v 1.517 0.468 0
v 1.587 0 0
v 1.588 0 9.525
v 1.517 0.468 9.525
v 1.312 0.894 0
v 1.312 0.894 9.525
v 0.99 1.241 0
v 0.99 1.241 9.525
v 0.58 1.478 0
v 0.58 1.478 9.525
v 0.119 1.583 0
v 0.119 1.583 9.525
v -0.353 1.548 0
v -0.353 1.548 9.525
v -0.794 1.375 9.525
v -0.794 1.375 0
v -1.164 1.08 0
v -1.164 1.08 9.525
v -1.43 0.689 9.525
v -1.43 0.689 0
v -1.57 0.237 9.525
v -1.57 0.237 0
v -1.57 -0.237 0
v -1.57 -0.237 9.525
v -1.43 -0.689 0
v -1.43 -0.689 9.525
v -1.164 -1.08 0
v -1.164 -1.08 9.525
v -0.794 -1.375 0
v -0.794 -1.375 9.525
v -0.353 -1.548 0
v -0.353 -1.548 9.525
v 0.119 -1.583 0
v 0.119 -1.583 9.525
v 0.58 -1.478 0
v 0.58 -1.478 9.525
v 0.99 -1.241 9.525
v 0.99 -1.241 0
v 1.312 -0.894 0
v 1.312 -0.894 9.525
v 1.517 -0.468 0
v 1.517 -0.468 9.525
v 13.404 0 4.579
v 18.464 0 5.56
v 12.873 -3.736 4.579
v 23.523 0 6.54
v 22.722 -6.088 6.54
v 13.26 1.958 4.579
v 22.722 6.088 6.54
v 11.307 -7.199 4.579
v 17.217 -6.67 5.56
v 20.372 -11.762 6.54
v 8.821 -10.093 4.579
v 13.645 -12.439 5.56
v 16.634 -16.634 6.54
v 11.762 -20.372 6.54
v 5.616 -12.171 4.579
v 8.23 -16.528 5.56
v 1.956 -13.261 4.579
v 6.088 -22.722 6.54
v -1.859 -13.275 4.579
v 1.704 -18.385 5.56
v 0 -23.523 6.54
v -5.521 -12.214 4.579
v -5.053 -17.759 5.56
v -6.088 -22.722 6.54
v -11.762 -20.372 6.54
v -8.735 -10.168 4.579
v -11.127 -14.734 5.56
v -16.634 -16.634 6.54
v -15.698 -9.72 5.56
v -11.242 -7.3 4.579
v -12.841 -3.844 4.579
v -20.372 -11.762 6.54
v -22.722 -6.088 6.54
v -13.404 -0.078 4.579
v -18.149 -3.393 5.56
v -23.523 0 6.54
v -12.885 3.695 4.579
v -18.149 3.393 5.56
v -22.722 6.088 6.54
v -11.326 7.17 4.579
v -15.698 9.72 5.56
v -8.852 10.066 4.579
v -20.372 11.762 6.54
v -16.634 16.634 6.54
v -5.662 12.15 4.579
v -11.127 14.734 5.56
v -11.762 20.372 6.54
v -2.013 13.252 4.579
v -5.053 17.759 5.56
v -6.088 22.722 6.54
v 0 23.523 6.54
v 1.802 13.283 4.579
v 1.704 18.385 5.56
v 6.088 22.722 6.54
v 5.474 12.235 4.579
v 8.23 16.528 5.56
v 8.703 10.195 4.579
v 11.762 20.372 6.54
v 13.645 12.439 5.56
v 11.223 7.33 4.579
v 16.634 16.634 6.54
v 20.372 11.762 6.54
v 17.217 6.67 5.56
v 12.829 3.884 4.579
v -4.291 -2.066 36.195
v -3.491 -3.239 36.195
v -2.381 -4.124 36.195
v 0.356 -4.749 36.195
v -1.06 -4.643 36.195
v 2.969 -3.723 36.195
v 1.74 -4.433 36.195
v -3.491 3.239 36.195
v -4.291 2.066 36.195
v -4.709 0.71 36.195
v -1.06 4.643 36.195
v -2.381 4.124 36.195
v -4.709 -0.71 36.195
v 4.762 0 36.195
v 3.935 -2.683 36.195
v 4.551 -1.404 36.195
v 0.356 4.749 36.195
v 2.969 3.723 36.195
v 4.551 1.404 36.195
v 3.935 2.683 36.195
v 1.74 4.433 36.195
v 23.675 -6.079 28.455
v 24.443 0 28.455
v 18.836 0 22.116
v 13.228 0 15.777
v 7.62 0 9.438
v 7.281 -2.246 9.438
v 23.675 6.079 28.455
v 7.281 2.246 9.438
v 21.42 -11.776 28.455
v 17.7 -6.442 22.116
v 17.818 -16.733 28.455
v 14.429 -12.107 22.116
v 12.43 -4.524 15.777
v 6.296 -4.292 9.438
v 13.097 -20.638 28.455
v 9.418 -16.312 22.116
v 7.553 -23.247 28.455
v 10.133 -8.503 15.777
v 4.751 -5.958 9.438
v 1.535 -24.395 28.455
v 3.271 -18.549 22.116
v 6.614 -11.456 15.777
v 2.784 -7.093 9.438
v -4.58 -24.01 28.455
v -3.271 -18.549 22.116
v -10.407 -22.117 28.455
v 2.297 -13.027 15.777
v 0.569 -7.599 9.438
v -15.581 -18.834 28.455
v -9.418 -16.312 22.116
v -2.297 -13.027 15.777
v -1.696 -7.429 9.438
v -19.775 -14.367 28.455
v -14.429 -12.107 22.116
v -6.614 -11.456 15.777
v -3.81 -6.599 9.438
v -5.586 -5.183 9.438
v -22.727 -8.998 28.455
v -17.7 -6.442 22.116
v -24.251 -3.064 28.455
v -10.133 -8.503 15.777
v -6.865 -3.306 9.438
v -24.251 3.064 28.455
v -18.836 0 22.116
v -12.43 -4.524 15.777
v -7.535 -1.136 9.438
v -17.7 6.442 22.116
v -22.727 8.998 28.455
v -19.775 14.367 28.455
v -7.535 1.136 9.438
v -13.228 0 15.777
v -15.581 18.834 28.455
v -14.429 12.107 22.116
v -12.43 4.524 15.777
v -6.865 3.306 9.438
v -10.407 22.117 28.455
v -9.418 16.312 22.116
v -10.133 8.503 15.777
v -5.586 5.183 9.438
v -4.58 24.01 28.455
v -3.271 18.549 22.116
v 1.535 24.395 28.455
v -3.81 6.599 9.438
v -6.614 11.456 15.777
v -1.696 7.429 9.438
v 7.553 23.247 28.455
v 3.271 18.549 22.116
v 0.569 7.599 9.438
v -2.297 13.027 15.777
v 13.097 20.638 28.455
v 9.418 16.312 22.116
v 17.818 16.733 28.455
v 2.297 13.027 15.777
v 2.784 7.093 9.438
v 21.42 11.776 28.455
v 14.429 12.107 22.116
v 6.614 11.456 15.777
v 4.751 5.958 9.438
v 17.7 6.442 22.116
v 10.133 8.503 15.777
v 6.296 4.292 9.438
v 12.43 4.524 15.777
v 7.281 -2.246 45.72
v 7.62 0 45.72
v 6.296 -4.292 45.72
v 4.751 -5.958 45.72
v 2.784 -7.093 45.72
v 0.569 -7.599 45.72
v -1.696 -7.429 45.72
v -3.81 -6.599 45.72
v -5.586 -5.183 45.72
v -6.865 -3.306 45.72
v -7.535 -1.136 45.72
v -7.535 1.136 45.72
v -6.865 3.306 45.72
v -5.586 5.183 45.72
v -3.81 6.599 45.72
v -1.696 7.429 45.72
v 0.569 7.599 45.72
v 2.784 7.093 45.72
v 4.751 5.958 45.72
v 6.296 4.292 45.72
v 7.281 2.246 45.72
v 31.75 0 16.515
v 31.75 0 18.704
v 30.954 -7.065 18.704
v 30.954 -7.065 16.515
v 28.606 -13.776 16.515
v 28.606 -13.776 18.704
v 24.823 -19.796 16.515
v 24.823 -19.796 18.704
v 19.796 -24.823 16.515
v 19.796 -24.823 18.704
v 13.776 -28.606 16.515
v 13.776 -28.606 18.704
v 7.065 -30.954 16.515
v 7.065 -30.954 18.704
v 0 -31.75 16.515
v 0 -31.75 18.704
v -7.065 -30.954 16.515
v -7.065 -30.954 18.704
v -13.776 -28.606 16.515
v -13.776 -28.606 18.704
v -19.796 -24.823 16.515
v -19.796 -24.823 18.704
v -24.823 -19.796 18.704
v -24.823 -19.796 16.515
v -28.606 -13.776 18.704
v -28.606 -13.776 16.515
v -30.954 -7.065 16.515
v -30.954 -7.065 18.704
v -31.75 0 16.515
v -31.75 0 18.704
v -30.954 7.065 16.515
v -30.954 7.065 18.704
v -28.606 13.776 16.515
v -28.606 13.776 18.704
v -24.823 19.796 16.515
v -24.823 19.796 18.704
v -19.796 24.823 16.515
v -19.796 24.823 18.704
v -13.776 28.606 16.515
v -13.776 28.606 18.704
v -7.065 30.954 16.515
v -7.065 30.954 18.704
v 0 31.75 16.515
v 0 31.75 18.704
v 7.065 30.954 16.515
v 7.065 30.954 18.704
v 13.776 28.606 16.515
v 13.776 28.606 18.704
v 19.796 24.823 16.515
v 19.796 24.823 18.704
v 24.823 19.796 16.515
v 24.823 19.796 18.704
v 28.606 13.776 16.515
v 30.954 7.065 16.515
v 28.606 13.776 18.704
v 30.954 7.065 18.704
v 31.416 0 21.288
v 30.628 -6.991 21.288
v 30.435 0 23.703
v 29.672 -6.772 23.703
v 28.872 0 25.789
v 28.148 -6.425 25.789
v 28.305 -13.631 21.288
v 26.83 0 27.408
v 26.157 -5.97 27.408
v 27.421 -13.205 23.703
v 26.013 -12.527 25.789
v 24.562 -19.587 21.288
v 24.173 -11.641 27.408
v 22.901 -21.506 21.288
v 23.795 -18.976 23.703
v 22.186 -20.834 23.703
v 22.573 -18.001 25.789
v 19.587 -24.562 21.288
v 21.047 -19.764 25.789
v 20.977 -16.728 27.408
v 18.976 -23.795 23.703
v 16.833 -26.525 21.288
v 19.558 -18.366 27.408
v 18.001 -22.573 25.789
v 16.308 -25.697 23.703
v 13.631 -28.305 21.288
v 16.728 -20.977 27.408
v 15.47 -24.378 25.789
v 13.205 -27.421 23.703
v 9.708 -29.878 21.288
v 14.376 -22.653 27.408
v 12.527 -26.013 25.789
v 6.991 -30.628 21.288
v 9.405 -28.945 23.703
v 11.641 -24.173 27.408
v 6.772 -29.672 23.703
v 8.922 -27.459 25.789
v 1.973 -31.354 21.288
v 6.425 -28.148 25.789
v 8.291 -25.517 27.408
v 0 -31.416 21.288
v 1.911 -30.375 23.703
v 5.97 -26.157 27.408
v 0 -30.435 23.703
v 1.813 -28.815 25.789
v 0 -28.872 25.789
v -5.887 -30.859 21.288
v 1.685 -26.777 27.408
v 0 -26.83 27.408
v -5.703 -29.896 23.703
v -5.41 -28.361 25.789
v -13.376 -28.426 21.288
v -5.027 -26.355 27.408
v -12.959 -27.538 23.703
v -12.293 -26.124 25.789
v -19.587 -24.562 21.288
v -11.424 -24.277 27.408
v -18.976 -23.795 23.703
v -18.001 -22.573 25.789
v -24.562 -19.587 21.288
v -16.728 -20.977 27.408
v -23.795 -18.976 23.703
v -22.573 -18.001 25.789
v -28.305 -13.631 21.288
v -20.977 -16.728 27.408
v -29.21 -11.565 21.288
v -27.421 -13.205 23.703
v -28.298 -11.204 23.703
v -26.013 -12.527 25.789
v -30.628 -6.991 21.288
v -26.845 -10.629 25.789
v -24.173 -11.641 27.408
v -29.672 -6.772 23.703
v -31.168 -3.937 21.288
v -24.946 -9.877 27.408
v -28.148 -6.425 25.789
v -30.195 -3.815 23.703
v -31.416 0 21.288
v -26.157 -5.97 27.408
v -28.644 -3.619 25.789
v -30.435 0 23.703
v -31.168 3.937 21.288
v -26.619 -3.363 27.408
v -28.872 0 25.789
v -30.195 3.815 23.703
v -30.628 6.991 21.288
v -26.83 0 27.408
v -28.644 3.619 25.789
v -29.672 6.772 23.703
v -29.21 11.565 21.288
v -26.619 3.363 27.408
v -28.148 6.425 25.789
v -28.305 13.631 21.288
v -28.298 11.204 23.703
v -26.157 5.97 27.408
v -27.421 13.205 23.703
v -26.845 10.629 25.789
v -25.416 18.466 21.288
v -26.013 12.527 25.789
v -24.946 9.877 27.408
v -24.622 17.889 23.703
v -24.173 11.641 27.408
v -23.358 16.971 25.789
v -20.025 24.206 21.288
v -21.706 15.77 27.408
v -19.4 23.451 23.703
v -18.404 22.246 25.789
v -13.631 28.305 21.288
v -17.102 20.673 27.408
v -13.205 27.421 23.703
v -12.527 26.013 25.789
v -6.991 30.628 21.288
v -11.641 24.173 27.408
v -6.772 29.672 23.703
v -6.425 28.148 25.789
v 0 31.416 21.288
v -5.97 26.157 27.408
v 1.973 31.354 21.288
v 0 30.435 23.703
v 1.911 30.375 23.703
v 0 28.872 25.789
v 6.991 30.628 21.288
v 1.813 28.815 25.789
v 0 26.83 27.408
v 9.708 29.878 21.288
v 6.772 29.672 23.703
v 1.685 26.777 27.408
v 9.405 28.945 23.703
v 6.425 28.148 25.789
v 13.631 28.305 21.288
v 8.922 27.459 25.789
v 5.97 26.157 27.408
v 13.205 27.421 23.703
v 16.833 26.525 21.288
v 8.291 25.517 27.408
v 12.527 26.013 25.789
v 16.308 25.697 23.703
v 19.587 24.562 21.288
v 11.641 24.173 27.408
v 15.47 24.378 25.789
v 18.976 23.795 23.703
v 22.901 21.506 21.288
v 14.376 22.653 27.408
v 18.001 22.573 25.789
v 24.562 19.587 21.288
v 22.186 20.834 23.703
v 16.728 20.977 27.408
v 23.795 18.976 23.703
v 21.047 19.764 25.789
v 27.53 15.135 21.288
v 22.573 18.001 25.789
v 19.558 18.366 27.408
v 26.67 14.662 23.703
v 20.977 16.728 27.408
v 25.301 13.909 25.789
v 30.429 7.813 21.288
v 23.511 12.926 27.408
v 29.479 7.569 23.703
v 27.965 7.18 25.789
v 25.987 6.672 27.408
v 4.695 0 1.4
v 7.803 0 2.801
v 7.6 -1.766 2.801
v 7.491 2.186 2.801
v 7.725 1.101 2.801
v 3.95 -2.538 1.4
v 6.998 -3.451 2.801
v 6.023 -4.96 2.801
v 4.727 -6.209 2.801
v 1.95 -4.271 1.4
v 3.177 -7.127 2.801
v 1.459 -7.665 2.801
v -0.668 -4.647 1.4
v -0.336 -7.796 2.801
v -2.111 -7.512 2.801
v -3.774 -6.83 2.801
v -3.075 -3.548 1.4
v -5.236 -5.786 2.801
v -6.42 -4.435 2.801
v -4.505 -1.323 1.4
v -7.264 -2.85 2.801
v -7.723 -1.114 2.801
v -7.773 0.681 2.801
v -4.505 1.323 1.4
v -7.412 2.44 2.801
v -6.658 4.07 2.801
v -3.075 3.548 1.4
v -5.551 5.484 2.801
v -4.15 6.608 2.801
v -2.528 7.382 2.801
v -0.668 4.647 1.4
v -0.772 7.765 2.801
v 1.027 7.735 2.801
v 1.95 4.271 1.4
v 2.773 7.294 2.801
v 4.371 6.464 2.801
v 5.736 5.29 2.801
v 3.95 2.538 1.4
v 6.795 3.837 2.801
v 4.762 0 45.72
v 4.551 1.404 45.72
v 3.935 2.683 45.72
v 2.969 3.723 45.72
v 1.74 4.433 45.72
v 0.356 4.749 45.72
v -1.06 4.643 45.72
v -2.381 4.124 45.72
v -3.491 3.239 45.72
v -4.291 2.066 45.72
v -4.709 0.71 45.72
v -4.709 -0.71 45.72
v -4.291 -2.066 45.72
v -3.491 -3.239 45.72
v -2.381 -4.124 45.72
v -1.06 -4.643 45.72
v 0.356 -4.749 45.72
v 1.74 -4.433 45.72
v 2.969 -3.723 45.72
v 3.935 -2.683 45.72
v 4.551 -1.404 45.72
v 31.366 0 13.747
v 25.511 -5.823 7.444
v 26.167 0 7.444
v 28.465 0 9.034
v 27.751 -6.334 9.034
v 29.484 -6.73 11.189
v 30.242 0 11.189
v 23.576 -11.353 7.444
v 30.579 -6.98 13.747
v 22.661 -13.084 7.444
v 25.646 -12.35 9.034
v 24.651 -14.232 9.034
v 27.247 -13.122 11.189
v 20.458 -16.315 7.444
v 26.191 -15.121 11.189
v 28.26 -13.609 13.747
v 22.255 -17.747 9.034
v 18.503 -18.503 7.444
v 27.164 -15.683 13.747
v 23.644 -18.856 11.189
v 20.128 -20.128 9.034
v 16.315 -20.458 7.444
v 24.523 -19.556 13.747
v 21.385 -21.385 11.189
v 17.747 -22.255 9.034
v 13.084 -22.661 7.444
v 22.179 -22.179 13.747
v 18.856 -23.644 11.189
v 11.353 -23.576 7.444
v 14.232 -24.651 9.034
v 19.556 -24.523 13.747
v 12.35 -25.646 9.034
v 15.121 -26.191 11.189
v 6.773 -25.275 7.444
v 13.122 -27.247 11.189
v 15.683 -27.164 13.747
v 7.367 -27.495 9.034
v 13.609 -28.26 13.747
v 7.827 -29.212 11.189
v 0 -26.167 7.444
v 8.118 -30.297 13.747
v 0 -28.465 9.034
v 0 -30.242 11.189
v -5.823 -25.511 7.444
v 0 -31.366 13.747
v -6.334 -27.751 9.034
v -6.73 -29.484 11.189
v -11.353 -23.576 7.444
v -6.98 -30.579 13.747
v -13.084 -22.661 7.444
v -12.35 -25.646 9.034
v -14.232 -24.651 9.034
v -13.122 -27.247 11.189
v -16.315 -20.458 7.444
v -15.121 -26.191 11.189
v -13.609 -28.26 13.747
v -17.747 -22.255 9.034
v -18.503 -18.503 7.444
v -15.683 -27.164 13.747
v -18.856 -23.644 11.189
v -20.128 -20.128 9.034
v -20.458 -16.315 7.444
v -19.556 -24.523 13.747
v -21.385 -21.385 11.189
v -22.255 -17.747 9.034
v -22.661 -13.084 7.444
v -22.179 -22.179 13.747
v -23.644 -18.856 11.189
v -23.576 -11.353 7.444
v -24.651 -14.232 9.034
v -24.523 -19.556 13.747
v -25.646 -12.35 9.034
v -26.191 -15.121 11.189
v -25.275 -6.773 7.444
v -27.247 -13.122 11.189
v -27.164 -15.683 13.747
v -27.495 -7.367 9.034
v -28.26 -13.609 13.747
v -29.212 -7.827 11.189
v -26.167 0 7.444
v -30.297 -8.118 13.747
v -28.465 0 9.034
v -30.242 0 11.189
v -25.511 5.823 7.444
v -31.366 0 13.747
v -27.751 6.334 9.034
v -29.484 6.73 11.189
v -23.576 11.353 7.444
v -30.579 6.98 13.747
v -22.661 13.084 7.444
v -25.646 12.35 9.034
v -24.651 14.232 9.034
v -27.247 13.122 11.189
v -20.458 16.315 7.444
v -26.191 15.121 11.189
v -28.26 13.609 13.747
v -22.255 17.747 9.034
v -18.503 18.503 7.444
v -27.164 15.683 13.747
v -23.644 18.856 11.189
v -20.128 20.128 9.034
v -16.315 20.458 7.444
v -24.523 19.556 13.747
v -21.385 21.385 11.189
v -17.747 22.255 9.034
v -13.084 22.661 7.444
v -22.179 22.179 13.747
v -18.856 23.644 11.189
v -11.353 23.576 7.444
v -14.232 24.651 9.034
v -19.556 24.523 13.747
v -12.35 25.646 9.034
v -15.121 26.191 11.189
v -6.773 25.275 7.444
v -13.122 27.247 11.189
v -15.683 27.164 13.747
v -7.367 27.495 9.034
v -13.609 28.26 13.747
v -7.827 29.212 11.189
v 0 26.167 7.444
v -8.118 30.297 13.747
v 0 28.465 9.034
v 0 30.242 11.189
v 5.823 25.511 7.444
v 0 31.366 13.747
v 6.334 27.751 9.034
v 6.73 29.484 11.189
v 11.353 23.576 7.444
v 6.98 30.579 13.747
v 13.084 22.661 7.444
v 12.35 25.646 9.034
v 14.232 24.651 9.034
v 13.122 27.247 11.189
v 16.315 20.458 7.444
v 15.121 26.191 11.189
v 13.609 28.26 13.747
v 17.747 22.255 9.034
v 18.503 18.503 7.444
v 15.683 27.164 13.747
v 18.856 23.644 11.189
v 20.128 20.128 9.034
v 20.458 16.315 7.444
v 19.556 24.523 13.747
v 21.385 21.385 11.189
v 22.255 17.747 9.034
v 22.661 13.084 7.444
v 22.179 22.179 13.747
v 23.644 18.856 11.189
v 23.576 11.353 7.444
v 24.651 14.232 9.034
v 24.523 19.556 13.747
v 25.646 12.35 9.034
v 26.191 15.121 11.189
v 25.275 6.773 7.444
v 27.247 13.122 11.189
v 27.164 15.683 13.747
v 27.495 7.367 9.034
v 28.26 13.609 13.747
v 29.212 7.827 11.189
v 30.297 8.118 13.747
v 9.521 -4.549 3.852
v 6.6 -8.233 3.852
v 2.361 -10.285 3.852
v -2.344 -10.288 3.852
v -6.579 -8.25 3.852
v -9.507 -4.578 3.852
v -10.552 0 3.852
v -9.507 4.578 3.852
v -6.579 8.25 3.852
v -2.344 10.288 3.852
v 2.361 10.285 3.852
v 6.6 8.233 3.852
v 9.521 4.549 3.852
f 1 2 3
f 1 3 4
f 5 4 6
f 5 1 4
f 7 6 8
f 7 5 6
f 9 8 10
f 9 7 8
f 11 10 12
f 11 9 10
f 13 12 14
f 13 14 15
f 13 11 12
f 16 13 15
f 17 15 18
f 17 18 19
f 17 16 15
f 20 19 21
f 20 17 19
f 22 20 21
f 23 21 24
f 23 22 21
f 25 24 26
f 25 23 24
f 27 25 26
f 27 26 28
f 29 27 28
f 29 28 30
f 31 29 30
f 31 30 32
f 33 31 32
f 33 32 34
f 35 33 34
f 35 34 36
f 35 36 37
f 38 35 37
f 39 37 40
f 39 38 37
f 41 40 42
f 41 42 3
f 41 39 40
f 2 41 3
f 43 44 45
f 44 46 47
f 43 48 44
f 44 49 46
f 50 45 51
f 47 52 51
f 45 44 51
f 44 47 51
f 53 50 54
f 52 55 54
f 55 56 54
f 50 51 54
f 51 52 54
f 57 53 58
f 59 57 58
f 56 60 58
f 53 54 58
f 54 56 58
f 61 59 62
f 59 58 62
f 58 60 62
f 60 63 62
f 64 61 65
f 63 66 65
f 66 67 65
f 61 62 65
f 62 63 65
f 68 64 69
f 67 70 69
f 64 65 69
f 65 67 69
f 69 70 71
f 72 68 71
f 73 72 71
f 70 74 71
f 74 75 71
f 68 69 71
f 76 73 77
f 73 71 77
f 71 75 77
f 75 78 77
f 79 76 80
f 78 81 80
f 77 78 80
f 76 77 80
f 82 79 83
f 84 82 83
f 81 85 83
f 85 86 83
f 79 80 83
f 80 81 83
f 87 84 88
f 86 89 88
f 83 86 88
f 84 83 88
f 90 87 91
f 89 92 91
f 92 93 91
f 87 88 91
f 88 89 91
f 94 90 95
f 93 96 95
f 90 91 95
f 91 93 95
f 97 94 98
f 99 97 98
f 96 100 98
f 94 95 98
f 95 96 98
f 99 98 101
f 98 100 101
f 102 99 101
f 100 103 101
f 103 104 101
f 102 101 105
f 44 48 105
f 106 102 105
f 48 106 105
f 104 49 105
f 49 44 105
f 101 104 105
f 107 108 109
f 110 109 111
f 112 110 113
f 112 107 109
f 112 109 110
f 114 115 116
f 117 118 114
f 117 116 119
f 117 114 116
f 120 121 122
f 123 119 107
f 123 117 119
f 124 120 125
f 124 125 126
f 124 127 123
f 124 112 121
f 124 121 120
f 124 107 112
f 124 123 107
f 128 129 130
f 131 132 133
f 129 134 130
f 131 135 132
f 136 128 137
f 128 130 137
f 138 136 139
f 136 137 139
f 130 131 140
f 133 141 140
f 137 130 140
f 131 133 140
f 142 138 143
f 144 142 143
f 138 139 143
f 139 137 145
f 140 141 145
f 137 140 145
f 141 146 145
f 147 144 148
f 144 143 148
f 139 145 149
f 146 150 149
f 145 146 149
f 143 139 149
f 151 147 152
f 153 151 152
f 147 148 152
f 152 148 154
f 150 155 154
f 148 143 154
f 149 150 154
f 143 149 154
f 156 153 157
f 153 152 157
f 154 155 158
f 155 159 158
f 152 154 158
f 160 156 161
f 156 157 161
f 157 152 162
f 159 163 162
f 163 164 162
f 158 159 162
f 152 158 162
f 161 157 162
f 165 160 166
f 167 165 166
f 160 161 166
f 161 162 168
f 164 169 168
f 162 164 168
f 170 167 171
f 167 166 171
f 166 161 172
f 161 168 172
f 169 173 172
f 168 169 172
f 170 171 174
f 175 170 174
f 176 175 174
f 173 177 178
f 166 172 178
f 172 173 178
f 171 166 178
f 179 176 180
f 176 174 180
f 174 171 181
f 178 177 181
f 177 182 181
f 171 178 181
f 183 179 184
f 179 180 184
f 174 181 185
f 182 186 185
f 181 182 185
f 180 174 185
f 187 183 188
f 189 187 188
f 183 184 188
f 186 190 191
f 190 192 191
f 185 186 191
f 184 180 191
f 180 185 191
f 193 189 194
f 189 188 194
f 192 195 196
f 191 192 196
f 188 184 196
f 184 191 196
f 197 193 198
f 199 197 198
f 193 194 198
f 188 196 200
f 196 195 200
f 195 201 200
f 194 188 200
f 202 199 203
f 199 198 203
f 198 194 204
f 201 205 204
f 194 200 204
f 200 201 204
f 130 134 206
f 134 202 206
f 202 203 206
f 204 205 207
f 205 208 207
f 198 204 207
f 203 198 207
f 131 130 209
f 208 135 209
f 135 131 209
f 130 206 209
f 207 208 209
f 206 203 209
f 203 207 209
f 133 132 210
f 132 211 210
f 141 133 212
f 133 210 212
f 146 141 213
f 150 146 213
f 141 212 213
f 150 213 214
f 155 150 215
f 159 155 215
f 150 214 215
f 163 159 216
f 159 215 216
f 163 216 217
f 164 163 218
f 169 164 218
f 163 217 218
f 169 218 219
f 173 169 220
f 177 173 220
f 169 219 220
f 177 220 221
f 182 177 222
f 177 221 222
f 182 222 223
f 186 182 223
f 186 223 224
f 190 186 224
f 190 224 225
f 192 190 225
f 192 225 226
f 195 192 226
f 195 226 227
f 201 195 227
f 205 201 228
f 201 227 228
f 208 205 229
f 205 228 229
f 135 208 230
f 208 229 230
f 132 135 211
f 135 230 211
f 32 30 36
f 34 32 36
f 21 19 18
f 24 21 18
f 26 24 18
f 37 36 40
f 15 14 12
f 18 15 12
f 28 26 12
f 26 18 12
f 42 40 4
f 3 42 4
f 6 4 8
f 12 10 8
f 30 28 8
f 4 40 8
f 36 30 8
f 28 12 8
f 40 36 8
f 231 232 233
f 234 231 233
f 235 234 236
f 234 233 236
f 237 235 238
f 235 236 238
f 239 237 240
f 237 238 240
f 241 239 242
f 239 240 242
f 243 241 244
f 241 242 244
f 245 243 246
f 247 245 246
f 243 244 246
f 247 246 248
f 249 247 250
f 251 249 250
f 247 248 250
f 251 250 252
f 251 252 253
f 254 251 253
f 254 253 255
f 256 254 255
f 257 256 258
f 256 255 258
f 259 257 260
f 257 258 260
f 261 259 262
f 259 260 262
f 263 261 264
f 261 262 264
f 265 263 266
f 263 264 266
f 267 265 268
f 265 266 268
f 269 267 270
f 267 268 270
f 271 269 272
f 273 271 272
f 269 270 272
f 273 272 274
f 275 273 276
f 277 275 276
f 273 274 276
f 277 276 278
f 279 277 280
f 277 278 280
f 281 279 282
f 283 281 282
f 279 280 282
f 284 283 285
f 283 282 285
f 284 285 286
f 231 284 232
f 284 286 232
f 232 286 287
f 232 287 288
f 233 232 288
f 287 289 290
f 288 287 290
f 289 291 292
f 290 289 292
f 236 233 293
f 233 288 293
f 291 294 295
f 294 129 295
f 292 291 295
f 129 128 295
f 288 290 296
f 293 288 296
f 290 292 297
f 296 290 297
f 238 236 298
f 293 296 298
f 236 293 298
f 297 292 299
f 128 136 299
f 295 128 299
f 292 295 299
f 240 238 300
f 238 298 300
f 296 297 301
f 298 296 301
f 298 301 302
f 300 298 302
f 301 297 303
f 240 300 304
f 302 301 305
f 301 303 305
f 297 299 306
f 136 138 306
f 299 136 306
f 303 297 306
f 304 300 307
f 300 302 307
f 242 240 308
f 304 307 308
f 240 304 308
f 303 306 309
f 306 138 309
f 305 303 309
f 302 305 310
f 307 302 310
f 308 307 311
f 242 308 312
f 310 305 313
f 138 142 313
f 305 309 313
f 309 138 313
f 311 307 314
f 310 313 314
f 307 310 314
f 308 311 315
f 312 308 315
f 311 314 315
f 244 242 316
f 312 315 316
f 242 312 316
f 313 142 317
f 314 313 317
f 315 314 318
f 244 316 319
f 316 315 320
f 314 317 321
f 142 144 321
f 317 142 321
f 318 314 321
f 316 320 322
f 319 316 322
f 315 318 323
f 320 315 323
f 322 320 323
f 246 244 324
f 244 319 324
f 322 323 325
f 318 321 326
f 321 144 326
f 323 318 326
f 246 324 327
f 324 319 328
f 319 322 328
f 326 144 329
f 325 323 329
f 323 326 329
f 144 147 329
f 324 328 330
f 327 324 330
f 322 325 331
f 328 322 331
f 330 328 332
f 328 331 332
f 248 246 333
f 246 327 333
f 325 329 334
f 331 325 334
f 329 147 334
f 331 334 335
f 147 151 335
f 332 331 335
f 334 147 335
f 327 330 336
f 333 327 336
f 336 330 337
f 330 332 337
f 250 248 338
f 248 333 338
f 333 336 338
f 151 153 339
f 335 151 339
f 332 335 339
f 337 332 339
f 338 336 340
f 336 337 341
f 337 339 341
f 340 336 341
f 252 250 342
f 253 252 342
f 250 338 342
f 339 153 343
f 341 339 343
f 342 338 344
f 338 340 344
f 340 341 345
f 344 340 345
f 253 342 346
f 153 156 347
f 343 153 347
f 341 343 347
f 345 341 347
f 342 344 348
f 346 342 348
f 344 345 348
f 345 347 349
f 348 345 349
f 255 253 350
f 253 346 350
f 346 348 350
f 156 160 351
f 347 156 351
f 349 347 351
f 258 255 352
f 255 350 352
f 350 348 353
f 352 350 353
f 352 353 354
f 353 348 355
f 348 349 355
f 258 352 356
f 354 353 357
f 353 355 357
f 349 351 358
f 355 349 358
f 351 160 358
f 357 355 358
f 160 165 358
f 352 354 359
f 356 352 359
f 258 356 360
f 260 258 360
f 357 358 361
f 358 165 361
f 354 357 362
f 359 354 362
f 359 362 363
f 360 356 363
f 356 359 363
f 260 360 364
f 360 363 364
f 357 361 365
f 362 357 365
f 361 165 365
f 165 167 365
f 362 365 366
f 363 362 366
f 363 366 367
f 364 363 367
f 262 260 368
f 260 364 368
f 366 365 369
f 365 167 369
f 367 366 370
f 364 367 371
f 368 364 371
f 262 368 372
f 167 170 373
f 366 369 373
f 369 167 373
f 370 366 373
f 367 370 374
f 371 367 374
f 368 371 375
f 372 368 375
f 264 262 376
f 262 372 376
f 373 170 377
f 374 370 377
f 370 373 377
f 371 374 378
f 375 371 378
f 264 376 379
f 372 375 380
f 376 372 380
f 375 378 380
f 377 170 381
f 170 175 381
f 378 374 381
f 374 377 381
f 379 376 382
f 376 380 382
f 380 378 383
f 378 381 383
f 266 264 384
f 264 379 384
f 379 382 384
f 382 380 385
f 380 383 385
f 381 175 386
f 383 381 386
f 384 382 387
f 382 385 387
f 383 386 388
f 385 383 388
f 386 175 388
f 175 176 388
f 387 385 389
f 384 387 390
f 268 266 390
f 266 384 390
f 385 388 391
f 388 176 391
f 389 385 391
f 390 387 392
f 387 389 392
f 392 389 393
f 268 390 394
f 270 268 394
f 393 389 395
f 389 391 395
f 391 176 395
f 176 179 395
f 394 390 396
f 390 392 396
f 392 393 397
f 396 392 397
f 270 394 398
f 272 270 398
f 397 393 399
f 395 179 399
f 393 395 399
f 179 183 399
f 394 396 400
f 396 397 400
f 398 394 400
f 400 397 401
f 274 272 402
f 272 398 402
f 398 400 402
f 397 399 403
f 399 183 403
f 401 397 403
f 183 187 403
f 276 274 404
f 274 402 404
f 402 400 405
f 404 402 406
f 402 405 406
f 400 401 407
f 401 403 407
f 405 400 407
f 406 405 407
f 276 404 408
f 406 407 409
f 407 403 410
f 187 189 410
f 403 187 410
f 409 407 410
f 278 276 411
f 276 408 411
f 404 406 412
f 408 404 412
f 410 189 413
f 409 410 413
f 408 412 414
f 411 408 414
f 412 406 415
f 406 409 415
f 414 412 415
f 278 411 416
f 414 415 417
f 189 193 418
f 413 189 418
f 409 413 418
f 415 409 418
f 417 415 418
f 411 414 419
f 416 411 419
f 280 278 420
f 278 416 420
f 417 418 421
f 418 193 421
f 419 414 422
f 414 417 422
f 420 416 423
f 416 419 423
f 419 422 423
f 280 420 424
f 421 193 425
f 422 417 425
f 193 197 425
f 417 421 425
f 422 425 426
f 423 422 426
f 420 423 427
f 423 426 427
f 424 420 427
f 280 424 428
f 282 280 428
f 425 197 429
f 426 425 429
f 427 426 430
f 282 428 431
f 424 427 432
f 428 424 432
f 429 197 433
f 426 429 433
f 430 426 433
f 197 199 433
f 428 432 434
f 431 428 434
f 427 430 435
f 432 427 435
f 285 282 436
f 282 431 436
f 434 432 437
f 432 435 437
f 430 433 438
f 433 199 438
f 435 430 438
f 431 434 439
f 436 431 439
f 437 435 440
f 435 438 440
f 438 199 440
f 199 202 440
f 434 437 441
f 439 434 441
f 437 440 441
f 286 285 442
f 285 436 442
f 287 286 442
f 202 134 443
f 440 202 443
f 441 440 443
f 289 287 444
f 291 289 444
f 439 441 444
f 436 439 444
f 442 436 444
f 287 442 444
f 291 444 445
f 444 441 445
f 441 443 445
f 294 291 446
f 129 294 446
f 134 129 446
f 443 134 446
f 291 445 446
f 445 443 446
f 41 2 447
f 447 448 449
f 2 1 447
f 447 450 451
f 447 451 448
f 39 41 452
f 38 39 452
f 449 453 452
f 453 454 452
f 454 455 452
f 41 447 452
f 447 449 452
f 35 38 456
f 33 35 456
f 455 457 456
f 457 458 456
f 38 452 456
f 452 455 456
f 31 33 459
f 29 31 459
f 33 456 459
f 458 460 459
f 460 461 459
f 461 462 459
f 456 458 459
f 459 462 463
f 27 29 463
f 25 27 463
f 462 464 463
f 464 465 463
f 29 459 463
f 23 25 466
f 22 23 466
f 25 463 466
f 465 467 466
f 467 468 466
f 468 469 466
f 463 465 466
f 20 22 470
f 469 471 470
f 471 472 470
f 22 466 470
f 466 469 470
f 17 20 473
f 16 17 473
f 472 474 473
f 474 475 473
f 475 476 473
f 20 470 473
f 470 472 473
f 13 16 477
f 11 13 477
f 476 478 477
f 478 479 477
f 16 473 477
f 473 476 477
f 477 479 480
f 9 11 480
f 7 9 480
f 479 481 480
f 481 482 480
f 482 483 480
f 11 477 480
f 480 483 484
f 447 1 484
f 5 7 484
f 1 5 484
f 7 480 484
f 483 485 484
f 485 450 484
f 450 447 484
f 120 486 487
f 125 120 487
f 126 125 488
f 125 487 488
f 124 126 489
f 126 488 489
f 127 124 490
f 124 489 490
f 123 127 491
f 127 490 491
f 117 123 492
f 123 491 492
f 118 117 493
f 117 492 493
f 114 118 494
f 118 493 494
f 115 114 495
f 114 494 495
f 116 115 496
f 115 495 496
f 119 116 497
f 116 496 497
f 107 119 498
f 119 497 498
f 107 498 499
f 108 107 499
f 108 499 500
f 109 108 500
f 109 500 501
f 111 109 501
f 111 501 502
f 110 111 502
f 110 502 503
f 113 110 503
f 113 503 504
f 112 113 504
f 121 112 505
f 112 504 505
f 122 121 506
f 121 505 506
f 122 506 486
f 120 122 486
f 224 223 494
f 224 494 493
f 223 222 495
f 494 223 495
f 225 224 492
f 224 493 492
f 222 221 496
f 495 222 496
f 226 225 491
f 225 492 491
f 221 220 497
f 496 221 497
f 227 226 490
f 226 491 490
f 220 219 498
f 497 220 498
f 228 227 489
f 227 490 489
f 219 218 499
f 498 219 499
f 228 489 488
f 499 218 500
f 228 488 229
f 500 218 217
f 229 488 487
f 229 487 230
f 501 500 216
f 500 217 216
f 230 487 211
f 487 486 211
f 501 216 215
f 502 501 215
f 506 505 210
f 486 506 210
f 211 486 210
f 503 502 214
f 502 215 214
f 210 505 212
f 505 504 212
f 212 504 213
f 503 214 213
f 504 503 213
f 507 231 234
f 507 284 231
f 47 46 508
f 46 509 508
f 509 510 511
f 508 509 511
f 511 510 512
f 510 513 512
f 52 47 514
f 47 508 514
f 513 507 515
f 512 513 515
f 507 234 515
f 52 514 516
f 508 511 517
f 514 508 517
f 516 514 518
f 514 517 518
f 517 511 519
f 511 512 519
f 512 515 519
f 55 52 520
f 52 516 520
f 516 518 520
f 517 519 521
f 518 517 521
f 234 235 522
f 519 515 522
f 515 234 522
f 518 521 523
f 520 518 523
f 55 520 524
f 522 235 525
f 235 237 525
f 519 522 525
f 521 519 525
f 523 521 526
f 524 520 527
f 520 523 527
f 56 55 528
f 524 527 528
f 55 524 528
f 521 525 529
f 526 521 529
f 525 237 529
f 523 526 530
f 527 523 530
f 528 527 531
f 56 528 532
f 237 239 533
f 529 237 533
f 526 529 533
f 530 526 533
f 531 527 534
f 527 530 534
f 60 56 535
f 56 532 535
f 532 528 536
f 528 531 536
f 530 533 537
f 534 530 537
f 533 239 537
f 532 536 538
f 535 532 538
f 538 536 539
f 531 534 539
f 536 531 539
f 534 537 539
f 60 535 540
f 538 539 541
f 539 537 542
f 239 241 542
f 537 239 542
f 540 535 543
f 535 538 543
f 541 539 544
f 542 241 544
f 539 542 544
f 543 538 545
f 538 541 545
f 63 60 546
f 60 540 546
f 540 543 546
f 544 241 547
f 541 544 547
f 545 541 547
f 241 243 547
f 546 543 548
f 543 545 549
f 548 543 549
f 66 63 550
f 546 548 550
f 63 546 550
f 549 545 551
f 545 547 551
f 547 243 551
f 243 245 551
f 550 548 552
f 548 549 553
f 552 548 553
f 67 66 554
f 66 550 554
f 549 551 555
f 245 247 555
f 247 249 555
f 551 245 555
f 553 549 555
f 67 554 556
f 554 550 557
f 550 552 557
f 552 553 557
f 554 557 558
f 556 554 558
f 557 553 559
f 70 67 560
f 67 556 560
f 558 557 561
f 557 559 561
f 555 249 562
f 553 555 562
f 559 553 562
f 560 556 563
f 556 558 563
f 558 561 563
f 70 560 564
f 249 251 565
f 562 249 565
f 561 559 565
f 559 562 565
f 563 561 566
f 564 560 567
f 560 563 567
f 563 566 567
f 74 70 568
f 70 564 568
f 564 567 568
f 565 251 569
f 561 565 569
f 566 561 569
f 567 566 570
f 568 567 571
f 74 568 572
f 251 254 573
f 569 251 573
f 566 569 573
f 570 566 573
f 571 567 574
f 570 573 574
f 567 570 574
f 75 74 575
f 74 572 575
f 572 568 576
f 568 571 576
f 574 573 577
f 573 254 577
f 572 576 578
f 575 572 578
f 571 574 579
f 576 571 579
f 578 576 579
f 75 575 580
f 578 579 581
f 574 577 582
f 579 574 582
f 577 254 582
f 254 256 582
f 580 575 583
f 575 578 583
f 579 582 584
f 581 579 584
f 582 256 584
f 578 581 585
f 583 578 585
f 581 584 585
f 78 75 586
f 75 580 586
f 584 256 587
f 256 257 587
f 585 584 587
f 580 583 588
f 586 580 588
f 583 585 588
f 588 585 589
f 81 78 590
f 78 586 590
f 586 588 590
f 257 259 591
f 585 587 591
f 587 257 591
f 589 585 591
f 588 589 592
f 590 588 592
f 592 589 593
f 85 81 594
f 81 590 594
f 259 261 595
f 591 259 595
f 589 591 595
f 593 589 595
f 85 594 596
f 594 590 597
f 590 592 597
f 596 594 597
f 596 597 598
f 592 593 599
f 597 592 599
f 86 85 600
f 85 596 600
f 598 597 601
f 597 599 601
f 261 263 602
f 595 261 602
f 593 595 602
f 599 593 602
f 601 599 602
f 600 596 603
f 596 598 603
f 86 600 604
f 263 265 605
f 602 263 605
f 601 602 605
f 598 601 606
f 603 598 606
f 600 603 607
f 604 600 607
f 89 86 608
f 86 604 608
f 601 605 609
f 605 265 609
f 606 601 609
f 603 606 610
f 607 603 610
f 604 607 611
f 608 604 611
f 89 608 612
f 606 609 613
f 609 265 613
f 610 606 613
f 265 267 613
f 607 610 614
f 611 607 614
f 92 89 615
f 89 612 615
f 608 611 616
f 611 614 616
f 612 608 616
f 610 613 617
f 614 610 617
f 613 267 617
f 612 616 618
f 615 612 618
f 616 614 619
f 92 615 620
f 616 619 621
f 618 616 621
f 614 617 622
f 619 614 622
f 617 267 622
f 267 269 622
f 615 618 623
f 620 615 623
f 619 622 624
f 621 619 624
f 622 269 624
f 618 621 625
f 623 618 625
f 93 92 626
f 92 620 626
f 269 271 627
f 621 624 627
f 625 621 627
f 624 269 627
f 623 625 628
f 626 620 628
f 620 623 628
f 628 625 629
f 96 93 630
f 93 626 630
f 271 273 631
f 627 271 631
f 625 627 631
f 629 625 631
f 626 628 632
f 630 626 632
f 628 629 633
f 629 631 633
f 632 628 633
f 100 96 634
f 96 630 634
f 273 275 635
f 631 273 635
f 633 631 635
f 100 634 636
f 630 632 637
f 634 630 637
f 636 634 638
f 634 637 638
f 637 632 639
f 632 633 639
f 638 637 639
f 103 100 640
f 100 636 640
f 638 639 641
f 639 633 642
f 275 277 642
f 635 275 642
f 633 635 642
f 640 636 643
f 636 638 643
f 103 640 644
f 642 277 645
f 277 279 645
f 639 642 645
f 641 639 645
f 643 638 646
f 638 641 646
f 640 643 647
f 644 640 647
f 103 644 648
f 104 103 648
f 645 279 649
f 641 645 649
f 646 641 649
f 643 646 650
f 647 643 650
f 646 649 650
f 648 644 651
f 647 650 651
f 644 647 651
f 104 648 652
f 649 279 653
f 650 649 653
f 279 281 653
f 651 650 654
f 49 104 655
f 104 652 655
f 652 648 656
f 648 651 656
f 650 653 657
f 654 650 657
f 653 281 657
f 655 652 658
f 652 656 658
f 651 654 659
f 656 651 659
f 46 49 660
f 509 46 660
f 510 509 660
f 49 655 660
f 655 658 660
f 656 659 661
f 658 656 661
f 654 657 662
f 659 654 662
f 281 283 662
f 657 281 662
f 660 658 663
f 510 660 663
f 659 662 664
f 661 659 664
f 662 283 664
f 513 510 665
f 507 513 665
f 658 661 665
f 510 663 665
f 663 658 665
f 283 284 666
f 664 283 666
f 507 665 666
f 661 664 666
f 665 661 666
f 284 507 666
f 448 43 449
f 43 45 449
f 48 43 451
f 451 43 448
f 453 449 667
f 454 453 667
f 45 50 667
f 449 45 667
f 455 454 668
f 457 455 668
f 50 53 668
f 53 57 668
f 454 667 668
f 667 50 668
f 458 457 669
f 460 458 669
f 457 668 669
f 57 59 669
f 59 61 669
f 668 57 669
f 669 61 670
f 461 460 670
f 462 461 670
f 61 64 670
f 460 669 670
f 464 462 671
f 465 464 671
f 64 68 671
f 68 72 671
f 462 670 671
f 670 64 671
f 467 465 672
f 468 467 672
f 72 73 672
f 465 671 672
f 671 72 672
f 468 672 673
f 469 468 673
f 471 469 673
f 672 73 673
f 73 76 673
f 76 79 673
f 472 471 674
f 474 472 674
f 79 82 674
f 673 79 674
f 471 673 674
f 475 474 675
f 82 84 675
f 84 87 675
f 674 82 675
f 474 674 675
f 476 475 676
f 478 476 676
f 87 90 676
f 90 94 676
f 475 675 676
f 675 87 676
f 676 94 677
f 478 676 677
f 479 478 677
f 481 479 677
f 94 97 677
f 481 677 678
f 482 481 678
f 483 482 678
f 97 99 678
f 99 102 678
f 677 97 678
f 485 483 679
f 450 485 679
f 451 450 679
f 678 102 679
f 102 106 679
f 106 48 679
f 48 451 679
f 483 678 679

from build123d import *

# Parameters (mm, degrees)
F3_R     = 25.4
F4_R     = 4.7625
F5_DEPTH = 9.525
F6_R     = 1.5875
F7_DEPTH = 9.525


# Not quite as in the source:
# - a fillet or chamfer that OpenCascade refuses, or shapes differently, is made with other operations: its cross-section is extruded or revolved along the edge and cut away or added


with BuildPart() as f1:
    # F0 (on Front) → F1 (revolve)
    with BuildSketch(Plane.XZ):
        Polygon((10.5000606809, 4.0159458295), (31.75, 8.134865202), (31.75, 28.454865202), (24.4433090497, 28.454865202), (7.62, 9.4384327507), (7.62, 45.72), (0, 45.72), (0, 0), (1.5875, 0), align=None)
    revolve(axis=Axis((0, 0, 22.86), (0, 0, -1)))

    # F2: fillet of radius 10.16 on 3 edges, made by hand

    # F2_s1 → F2_t2 (revolve, cut)
    with BuildSketch(Plane.XZ):
        with BuildLine():
            ThreePointArc((23.5233497224, 6.5402766862), (29.4279982514, 10.0500062027), (31.75, 16.5146317456))
            Line((31.75, 16.5146317456), (31.75, 8.134865202))
            Line((31.75, 8.134865202), (23.5233497224, 6.5402766862))
        make_face()
    revolve(axis=Axis((0, 0, 8.134865202), (0, 0, -1)), mode=Mode.SUBTRACT)

    # F2_s3 → F2_t4 (revolve, cut)
    with BuildSketch(Plane.XZ):
        with BuildLine():
            ThreePointArc((31.75, 18.7037510366), (29.7206586432, 24.7962045676), (24.4433090497, 28.454865202))
            Line((24.4433090497, 28.454865202), (31.75, 28.454865202))
            Line((31.75, 28.454865202), (31.75, 18.7037510366))
        make_face()
    revolve(axis=Axis((0, 0, 28.454865202), (0, 0, -1)), mode=Mode.SUBTRACT)

    # F3
    f3_edges = [f1.edges().sort_by_distance(p)[0] for p in [
        (-10.500061, 0, 4.015946),
    ]]
    fillet(f3_edges, radius=F3_R)

    # F4 (on face) → F5 (cut)
    with BuildSketch(Plane.XY.offset(45.72)):
        Circle(F4_R)
    extrude(amount=-F5_DEPTH, mode=Mode.SUBTRACT)

    # F6 (on Top) → F7 (cut)
    with BuildSketch(Plane.XY):
        Circle(F6_R)
    extrude(amount=F7_DEPTH, mode=Mode.SUBTRACT)


solid = f1.part
